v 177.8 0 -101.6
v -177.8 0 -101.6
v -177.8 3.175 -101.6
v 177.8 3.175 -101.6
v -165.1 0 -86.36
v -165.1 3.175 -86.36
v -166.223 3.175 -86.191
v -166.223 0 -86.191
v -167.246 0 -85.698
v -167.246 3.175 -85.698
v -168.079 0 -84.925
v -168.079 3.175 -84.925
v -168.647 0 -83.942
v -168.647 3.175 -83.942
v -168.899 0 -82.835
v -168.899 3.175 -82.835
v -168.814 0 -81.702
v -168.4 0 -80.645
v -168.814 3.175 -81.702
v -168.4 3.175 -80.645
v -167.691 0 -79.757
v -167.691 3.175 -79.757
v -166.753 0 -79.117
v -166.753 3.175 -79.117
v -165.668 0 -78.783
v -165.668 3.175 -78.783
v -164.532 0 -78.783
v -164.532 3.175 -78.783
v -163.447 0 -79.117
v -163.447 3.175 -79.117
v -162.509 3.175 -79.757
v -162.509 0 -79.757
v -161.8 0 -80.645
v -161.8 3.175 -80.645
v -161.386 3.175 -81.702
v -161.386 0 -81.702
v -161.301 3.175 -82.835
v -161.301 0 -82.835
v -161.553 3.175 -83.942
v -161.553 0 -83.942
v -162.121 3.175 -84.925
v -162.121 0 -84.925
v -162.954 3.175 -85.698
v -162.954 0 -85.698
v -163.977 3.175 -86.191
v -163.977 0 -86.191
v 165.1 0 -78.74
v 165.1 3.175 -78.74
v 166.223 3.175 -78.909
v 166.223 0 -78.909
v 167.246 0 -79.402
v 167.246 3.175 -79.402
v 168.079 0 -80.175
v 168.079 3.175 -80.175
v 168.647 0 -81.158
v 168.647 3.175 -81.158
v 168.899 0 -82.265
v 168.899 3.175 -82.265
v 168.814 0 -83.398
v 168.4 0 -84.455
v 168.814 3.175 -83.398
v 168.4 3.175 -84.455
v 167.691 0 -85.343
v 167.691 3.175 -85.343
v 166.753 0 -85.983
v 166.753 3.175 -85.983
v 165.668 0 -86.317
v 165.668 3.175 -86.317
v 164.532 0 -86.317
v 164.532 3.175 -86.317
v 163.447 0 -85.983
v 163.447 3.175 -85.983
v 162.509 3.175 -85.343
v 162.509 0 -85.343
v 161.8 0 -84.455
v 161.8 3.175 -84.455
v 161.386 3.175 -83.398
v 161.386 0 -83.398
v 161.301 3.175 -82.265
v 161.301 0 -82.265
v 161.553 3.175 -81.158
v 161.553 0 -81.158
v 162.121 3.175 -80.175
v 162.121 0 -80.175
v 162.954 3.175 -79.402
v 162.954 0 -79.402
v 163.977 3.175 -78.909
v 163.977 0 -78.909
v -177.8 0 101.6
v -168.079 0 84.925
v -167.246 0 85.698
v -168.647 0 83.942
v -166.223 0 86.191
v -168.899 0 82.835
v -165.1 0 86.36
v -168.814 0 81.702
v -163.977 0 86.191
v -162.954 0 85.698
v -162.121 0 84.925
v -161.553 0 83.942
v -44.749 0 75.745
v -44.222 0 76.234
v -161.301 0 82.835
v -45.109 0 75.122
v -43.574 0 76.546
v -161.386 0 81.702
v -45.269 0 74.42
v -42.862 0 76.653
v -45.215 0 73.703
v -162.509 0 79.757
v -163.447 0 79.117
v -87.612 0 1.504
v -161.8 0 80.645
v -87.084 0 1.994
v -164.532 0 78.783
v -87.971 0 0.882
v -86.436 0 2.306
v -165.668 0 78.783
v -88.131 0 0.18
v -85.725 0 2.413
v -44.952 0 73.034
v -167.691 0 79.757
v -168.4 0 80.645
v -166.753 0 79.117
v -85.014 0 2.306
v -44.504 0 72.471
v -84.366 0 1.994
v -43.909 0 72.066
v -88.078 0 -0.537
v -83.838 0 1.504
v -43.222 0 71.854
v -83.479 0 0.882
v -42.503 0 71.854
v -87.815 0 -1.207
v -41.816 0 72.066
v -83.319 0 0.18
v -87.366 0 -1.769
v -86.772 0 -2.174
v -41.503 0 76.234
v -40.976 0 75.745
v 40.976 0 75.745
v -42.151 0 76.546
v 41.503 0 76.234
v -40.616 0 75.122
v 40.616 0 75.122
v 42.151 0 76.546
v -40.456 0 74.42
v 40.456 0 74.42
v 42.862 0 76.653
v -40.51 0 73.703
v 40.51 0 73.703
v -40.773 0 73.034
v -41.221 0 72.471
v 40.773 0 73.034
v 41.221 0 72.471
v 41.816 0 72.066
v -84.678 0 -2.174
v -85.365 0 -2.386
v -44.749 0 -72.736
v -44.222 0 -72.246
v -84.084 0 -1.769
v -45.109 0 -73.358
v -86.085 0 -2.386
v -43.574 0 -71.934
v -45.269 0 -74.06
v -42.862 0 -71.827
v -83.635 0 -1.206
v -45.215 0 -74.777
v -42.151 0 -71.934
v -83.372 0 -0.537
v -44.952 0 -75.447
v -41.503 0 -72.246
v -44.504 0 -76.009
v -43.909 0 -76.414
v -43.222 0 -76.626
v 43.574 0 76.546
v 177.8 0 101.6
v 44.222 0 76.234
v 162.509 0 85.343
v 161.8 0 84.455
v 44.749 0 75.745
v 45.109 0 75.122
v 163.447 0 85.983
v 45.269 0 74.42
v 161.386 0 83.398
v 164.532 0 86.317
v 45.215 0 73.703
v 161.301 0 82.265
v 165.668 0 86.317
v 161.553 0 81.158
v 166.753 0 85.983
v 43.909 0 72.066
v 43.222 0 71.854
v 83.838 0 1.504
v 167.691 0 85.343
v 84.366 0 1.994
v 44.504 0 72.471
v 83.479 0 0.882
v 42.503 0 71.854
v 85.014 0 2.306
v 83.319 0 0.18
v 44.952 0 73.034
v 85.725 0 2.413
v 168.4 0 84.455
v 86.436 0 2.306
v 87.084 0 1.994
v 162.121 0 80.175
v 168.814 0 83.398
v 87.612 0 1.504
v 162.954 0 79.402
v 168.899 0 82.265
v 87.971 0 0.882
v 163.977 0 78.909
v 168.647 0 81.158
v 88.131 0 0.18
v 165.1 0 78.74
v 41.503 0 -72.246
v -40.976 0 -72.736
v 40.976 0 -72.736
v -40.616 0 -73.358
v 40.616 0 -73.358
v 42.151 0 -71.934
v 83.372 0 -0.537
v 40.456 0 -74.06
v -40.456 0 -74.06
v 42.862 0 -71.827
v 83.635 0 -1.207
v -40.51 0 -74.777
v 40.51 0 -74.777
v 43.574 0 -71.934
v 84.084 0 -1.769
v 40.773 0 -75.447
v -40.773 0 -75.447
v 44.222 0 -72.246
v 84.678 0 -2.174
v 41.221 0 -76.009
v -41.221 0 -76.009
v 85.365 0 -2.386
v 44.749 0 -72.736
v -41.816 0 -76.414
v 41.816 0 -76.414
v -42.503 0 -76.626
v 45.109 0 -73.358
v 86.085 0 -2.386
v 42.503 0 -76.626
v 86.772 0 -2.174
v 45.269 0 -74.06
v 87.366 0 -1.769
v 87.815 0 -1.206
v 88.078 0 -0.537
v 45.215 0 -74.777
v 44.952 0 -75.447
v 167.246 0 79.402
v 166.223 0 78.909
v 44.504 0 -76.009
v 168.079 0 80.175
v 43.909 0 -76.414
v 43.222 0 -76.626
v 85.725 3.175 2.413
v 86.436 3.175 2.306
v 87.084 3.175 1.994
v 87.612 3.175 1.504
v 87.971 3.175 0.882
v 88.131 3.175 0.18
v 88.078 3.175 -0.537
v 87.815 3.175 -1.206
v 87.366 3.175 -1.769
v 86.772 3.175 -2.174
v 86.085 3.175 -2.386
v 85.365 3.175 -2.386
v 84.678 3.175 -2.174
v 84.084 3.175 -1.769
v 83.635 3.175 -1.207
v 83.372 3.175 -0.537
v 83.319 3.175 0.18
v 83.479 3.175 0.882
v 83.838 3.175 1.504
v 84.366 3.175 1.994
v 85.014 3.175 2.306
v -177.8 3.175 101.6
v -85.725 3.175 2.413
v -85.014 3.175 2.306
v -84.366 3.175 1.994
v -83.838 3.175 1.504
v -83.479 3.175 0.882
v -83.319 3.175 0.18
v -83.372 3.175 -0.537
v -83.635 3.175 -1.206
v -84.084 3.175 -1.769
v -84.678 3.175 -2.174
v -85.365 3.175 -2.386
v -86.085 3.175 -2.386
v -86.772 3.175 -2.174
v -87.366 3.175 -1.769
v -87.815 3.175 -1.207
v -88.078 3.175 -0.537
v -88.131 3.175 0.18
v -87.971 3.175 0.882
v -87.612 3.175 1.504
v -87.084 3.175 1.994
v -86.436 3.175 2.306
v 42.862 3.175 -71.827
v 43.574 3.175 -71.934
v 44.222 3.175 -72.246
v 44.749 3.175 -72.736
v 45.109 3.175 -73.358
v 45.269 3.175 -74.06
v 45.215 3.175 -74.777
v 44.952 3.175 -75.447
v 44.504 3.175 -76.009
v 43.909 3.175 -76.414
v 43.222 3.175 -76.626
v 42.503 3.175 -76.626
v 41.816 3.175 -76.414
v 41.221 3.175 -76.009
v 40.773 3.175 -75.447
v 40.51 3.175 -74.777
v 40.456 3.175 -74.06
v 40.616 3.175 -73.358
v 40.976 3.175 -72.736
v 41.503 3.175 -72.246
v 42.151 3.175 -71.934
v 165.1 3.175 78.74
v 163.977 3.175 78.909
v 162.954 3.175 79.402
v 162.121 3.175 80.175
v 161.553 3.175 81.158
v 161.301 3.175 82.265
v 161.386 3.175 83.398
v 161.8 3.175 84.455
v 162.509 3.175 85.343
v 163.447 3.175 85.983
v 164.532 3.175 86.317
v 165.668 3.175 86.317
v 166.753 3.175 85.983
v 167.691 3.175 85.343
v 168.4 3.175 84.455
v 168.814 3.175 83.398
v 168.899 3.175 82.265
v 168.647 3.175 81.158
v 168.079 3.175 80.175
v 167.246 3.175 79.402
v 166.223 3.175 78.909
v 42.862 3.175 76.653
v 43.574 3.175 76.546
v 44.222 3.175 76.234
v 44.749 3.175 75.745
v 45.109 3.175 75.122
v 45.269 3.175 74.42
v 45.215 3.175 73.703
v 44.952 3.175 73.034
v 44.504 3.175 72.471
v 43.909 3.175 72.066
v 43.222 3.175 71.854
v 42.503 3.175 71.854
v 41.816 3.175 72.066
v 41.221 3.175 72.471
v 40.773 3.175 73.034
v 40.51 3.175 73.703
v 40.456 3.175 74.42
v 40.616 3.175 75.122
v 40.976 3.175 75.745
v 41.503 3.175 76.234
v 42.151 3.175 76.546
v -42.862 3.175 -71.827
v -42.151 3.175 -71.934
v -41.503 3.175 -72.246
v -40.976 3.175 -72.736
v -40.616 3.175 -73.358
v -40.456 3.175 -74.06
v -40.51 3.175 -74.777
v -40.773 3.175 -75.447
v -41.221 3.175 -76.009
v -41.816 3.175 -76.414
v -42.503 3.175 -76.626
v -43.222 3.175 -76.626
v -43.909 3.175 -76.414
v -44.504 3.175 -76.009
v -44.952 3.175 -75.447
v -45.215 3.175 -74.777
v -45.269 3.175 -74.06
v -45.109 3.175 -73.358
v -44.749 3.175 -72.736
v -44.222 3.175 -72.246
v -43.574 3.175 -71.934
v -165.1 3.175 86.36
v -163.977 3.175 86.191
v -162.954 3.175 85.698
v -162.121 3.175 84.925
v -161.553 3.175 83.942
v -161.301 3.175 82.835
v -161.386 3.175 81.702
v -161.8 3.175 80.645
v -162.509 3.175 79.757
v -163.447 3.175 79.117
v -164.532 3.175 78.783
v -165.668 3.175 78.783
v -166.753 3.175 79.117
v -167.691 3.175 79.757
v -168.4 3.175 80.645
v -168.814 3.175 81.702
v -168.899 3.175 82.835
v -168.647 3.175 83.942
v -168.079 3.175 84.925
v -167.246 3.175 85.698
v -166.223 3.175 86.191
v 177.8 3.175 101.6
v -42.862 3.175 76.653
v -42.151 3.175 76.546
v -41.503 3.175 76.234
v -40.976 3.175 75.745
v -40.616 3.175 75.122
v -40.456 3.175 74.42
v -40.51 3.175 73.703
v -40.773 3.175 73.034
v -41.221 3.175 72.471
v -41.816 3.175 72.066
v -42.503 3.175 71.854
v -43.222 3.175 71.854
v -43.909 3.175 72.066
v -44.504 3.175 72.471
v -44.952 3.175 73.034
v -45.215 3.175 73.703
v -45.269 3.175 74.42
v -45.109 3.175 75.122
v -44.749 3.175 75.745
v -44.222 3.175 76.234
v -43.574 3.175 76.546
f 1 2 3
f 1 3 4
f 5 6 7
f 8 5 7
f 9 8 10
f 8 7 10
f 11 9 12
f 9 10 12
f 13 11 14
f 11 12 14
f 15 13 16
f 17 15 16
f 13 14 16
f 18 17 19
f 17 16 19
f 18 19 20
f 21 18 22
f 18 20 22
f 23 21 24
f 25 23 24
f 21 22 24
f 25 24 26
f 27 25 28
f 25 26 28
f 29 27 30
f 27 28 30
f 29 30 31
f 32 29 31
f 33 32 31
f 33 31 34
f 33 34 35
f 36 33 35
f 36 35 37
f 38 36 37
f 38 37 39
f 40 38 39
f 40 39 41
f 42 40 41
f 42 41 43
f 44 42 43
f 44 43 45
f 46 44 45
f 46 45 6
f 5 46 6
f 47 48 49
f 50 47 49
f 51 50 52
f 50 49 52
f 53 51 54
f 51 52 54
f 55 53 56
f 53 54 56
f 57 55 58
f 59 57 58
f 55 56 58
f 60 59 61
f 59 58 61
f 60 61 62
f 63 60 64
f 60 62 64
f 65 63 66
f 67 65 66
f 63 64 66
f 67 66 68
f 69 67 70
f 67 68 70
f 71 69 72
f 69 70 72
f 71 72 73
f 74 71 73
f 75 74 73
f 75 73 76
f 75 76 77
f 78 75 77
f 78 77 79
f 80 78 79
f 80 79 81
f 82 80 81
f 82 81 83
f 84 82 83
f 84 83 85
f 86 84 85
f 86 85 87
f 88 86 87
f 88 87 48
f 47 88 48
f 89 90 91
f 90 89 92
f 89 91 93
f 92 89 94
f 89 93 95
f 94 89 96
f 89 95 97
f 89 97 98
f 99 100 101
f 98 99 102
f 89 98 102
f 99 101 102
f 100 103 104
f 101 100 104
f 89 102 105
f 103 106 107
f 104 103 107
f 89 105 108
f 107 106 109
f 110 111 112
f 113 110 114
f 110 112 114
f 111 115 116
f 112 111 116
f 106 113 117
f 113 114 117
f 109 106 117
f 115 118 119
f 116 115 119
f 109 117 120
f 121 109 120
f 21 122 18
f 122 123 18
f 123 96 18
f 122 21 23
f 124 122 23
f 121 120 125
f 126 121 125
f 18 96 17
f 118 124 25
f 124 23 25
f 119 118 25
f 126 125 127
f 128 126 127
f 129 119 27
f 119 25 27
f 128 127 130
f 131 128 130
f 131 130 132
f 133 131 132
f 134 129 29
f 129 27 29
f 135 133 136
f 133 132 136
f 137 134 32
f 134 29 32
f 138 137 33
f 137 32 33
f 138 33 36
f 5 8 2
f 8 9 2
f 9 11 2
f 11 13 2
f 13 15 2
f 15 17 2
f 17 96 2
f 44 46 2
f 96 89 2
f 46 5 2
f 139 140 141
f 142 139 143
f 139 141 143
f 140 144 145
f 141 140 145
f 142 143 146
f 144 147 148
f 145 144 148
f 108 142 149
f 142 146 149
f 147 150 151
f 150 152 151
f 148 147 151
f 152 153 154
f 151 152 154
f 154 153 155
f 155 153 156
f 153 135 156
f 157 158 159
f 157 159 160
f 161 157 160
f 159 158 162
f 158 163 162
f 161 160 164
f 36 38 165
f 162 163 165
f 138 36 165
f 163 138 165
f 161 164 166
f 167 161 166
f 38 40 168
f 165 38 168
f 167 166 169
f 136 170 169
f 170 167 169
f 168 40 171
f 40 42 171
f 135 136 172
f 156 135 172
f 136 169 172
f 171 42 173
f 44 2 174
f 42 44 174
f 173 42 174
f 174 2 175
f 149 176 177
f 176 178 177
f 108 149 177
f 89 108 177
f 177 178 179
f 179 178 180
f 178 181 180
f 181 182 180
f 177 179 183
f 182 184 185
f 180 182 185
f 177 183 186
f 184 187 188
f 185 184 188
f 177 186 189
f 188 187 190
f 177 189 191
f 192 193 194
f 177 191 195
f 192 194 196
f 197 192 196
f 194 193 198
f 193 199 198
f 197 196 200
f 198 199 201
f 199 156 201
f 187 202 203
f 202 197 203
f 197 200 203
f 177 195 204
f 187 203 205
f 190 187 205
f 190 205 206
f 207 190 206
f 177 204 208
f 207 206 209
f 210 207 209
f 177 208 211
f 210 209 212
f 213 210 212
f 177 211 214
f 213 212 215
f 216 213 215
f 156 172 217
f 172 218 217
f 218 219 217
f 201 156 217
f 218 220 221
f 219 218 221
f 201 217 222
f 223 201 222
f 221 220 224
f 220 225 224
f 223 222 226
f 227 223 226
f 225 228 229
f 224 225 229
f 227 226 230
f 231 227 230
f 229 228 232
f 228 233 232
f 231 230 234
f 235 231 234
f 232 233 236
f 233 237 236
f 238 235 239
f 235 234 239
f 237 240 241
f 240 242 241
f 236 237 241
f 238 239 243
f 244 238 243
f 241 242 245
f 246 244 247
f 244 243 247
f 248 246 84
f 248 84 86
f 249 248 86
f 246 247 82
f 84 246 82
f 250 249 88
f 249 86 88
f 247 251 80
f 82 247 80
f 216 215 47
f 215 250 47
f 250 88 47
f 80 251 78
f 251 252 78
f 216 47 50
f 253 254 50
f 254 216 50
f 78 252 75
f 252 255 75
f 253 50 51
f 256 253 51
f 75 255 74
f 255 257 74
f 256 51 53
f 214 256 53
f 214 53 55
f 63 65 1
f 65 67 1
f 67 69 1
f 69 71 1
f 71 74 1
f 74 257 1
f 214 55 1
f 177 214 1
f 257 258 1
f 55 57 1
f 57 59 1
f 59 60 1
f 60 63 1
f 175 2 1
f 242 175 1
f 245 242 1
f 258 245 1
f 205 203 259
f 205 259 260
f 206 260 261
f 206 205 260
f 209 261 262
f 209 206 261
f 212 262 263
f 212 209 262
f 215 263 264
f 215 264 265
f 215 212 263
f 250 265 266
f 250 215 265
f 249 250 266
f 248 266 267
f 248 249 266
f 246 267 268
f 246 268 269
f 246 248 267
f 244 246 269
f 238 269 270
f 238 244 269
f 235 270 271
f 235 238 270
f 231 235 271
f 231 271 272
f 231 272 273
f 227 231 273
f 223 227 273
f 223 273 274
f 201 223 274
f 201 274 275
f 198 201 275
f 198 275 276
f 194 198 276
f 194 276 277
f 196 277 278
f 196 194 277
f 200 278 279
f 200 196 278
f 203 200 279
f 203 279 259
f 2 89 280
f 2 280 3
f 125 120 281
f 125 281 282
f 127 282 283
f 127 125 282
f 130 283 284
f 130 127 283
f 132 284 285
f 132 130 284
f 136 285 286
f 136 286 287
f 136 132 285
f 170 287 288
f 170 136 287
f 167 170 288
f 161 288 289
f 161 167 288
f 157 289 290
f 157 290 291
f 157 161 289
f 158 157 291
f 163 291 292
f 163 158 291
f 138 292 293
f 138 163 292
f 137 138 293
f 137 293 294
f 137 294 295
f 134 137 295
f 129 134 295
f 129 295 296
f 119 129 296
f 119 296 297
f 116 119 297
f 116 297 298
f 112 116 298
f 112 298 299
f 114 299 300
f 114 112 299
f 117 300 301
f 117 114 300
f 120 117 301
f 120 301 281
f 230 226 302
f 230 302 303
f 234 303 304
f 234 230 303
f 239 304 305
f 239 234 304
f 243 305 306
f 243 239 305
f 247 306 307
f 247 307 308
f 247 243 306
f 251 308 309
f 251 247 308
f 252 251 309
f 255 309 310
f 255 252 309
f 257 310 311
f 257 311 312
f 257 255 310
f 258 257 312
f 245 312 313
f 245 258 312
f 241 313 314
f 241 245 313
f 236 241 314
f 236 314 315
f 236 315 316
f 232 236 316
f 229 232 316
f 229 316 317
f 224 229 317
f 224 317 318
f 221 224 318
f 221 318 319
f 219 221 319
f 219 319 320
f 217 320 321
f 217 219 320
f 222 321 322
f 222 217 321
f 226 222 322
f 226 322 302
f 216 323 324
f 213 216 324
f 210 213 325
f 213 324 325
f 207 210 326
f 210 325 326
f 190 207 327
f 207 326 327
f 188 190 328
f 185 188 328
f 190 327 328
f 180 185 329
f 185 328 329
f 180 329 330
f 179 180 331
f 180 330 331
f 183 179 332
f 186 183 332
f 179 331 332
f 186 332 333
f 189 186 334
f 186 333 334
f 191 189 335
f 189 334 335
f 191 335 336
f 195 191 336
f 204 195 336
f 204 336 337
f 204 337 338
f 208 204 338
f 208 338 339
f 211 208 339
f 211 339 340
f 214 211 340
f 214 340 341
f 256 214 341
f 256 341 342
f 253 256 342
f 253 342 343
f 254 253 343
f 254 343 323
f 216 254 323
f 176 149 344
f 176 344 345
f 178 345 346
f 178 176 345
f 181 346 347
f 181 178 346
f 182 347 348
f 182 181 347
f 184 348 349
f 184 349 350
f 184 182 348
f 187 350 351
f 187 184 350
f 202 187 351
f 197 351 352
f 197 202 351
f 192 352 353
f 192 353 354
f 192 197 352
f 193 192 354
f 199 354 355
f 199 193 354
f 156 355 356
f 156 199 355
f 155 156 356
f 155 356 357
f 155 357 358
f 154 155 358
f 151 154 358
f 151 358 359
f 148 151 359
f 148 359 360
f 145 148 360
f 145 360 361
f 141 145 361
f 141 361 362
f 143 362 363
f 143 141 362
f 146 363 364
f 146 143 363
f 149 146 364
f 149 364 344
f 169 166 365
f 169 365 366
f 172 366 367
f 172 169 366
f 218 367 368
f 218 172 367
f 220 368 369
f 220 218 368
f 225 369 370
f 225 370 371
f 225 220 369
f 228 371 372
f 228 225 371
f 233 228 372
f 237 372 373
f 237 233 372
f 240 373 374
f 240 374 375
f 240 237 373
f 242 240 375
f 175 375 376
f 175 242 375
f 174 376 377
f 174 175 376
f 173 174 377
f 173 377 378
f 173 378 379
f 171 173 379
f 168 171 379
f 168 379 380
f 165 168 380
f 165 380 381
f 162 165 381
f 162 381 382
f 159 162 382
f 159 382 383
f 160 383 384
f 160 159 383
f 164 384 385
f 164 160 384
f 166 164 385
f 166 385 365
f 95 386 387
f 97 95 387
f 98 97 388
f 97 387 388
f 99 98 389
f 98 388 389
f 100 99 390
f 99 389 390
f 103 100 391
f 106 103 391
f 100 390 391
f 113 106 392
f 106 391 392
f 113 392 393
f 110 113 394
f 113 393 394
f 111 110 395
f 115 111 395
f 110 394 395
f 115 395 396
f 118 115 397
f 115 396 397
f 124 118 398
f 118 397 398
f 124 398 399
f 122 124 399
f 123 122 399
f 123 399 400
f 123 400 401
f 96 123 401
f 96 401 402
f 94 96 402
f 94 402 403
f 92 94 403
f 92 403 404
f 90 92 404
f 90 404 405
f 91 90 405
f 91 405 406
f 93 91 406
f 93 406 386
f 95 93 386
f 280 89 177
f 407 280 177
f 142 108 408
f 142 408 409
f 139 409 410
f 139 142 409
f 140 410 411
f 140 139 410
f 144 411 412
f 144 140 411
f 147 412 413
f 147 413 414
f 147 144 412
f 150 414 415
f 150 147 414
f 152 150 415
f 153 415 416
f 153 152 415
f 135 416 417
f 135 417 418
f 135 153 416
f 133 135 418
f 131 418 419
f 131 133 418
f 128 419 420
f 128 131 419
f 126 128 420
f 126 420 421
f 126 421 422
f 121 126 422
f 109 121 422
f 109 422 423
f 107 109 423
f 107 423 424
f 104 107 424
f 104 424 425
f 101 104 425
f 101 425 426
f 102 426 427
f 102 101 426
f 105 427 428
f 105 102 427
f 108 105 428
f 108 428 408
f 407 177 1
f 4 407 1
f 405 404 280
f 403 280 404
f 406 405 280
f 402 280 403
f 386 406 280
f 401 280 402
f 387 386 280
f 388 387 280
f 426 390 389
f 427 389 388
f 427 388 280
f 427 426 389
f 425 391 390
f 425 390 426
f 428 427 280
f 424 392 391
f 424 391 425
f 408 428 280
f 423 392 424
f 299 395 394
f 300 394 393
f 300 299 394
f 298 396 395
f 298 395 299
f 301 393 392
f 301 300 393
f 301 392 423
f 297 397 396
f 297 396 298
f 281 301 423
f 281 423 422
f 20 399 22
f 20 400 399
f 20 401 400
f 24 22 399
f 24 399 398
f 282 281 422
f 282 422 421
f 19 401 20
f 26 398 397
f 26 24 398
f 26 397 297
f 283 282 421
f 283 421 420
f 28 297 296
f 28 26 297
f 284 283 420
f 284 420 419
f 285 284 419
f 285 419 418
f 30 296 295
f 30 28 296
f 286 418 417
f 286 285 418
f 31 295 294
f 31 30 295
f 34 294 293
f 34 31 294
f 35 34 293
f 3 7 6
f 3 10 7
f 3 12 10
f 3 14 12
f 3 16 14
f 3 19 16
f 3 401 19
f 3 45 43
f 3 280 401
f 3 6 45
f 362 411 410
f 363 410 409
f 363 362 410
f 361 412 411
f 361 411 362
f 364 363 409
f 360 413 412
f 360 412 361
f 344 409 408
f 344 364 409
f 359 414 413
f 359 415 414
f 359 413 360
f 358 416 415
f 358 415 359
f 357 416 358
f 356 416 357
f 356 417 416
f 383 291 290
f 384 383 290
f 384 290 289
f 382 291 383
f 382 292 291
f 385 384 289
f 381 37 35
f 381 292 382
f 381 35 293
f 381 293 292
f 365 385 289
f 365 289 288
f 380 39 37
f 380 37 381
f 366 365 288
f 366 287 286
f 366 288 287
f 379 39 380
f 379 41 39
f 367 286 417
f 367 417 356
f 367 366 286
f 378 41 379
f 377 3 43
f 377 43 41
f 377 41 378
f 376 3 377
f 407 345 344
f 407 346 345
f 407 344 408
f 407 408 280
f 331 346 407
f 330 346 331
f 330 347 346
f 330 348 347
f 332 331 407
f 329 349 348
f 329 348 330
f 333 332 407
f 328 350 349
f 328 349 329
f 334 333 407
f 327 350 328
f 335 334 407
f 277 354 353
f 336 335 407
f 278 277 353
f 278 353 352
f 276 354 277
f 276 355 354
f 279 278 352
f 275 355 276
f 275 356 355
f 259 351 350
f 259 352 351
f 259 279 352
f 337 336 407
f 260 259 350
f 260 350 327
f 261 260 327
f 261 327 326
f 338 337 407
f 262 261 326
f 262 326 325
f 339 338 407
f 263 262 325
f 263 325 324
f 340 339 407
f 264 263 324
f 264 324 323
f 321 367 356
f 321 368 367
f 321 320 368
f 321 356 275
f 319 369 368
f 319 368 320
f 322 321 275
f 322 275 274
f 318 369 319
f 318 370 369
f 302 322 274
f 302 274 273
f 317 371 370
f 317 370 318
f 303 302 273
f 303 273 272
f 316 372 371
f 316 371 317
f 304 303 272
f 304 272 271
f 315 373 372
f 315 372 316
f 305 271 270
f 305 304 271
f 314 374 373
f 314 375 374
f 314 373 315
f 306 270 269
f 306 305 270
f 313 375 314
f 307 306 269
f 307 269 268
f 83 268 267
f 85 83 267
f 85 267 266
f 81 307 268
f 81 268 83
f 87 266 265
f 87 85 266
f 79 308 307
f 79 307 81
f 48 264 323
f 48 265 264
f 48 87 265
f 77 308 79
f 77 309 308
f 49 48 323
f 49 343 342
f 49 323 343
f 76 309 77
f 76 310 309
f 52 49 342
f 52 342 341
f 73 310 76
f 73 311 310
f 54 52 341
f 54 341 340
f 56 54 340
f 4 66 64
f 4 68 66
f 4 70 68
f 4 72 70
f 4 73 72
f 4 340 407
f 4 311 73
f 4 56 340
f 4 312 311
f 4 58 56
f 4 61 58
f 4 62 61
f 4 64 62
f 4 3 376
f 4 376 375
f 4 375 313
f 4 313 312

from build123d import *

# Parameters (mm, degrees)
SKETCH1_W           = 355.6
SKETCH1_H           = 203.2
SKETCH1_R           = 2.413
BOSS_EXTRUDE1_DEPTH = 3.175
SKETCH2_R           = 3.81
CUT_EXTRUDE1_DEPTH  = 205.80595847


with BuildPart() as part:
    # Sketch1 → Boss-Extrude1 (new body)
    with BuildSketch(Plane(origin=(0, 0, 0), x_dir=(1, 0, 0), z_dir=(0, 1, 0))):
        Rectangle(SKETCH1_W, SKETCH1_H)
        with Locations(Location((42.8625, 74.240027739, 0), (0, 0, 270))):
            Circle(SKETCH1_R, mode=Mode.SUBTRACT)
        with Locations(Location((85.725, 0, 0), (0, 0, 270))):
            Circle(SKETCH1_R, mode=Mode.SUBTRACT)
        with Locations(Location((42.8625, -74.240027739, 0), (0, 0, 270))):
            Circle(SKETCH1_R, mode=Mode.SUBTRACT)
        with Locations(Location((-42.8625, -74.240027739, 0), (0, 0, 270))):
            Circle(SKETCH1_R, mode=Mode.SUBTRACT)
        with Locations(Location((-85.725, 0, 0), (0, 0, 270))):
            Circle(SKETCH1_R, mode=Mode.SUBTRACT)
        with Locations(Location((-42.8625, 74.240027739, 0), (0, 0, 270))):
            Circle(SKETCH1_R, mode=Mode.SUBTRACT)
    extrude(amount=BOSS_EXTRUDE1_DEPTH)

    # Sketch2 → Cut-Extrude1 (cut, through all)
    with BuildSketch(Plane(origin=(0, 3.175, 0), x_dir=(1, 0, 0), z_dir=(0, 1, 0))):
        with Locations(Location((165.1, 82.55, 0), (0, 0, 270))):
            Circle(SKETCH2_R)
        with Locations(Location((-165.1, 82.55, 0), (0, 0, 90))):
            Circle(SKETCH2_R)
        with Locations(Location((-165.1, -82.55, 0), (0, 0, 270))):
            Circle(SKETCH2_R)
        with Locations(Location((165.1, -82.55, 0), (0, 0, 90))):
            Circle(SKETCH2_R)
    extrude(amount=-CUT_EXTRUDE1_DEPTH, mode=Mode.SUBTRACT)


solid = part.part
